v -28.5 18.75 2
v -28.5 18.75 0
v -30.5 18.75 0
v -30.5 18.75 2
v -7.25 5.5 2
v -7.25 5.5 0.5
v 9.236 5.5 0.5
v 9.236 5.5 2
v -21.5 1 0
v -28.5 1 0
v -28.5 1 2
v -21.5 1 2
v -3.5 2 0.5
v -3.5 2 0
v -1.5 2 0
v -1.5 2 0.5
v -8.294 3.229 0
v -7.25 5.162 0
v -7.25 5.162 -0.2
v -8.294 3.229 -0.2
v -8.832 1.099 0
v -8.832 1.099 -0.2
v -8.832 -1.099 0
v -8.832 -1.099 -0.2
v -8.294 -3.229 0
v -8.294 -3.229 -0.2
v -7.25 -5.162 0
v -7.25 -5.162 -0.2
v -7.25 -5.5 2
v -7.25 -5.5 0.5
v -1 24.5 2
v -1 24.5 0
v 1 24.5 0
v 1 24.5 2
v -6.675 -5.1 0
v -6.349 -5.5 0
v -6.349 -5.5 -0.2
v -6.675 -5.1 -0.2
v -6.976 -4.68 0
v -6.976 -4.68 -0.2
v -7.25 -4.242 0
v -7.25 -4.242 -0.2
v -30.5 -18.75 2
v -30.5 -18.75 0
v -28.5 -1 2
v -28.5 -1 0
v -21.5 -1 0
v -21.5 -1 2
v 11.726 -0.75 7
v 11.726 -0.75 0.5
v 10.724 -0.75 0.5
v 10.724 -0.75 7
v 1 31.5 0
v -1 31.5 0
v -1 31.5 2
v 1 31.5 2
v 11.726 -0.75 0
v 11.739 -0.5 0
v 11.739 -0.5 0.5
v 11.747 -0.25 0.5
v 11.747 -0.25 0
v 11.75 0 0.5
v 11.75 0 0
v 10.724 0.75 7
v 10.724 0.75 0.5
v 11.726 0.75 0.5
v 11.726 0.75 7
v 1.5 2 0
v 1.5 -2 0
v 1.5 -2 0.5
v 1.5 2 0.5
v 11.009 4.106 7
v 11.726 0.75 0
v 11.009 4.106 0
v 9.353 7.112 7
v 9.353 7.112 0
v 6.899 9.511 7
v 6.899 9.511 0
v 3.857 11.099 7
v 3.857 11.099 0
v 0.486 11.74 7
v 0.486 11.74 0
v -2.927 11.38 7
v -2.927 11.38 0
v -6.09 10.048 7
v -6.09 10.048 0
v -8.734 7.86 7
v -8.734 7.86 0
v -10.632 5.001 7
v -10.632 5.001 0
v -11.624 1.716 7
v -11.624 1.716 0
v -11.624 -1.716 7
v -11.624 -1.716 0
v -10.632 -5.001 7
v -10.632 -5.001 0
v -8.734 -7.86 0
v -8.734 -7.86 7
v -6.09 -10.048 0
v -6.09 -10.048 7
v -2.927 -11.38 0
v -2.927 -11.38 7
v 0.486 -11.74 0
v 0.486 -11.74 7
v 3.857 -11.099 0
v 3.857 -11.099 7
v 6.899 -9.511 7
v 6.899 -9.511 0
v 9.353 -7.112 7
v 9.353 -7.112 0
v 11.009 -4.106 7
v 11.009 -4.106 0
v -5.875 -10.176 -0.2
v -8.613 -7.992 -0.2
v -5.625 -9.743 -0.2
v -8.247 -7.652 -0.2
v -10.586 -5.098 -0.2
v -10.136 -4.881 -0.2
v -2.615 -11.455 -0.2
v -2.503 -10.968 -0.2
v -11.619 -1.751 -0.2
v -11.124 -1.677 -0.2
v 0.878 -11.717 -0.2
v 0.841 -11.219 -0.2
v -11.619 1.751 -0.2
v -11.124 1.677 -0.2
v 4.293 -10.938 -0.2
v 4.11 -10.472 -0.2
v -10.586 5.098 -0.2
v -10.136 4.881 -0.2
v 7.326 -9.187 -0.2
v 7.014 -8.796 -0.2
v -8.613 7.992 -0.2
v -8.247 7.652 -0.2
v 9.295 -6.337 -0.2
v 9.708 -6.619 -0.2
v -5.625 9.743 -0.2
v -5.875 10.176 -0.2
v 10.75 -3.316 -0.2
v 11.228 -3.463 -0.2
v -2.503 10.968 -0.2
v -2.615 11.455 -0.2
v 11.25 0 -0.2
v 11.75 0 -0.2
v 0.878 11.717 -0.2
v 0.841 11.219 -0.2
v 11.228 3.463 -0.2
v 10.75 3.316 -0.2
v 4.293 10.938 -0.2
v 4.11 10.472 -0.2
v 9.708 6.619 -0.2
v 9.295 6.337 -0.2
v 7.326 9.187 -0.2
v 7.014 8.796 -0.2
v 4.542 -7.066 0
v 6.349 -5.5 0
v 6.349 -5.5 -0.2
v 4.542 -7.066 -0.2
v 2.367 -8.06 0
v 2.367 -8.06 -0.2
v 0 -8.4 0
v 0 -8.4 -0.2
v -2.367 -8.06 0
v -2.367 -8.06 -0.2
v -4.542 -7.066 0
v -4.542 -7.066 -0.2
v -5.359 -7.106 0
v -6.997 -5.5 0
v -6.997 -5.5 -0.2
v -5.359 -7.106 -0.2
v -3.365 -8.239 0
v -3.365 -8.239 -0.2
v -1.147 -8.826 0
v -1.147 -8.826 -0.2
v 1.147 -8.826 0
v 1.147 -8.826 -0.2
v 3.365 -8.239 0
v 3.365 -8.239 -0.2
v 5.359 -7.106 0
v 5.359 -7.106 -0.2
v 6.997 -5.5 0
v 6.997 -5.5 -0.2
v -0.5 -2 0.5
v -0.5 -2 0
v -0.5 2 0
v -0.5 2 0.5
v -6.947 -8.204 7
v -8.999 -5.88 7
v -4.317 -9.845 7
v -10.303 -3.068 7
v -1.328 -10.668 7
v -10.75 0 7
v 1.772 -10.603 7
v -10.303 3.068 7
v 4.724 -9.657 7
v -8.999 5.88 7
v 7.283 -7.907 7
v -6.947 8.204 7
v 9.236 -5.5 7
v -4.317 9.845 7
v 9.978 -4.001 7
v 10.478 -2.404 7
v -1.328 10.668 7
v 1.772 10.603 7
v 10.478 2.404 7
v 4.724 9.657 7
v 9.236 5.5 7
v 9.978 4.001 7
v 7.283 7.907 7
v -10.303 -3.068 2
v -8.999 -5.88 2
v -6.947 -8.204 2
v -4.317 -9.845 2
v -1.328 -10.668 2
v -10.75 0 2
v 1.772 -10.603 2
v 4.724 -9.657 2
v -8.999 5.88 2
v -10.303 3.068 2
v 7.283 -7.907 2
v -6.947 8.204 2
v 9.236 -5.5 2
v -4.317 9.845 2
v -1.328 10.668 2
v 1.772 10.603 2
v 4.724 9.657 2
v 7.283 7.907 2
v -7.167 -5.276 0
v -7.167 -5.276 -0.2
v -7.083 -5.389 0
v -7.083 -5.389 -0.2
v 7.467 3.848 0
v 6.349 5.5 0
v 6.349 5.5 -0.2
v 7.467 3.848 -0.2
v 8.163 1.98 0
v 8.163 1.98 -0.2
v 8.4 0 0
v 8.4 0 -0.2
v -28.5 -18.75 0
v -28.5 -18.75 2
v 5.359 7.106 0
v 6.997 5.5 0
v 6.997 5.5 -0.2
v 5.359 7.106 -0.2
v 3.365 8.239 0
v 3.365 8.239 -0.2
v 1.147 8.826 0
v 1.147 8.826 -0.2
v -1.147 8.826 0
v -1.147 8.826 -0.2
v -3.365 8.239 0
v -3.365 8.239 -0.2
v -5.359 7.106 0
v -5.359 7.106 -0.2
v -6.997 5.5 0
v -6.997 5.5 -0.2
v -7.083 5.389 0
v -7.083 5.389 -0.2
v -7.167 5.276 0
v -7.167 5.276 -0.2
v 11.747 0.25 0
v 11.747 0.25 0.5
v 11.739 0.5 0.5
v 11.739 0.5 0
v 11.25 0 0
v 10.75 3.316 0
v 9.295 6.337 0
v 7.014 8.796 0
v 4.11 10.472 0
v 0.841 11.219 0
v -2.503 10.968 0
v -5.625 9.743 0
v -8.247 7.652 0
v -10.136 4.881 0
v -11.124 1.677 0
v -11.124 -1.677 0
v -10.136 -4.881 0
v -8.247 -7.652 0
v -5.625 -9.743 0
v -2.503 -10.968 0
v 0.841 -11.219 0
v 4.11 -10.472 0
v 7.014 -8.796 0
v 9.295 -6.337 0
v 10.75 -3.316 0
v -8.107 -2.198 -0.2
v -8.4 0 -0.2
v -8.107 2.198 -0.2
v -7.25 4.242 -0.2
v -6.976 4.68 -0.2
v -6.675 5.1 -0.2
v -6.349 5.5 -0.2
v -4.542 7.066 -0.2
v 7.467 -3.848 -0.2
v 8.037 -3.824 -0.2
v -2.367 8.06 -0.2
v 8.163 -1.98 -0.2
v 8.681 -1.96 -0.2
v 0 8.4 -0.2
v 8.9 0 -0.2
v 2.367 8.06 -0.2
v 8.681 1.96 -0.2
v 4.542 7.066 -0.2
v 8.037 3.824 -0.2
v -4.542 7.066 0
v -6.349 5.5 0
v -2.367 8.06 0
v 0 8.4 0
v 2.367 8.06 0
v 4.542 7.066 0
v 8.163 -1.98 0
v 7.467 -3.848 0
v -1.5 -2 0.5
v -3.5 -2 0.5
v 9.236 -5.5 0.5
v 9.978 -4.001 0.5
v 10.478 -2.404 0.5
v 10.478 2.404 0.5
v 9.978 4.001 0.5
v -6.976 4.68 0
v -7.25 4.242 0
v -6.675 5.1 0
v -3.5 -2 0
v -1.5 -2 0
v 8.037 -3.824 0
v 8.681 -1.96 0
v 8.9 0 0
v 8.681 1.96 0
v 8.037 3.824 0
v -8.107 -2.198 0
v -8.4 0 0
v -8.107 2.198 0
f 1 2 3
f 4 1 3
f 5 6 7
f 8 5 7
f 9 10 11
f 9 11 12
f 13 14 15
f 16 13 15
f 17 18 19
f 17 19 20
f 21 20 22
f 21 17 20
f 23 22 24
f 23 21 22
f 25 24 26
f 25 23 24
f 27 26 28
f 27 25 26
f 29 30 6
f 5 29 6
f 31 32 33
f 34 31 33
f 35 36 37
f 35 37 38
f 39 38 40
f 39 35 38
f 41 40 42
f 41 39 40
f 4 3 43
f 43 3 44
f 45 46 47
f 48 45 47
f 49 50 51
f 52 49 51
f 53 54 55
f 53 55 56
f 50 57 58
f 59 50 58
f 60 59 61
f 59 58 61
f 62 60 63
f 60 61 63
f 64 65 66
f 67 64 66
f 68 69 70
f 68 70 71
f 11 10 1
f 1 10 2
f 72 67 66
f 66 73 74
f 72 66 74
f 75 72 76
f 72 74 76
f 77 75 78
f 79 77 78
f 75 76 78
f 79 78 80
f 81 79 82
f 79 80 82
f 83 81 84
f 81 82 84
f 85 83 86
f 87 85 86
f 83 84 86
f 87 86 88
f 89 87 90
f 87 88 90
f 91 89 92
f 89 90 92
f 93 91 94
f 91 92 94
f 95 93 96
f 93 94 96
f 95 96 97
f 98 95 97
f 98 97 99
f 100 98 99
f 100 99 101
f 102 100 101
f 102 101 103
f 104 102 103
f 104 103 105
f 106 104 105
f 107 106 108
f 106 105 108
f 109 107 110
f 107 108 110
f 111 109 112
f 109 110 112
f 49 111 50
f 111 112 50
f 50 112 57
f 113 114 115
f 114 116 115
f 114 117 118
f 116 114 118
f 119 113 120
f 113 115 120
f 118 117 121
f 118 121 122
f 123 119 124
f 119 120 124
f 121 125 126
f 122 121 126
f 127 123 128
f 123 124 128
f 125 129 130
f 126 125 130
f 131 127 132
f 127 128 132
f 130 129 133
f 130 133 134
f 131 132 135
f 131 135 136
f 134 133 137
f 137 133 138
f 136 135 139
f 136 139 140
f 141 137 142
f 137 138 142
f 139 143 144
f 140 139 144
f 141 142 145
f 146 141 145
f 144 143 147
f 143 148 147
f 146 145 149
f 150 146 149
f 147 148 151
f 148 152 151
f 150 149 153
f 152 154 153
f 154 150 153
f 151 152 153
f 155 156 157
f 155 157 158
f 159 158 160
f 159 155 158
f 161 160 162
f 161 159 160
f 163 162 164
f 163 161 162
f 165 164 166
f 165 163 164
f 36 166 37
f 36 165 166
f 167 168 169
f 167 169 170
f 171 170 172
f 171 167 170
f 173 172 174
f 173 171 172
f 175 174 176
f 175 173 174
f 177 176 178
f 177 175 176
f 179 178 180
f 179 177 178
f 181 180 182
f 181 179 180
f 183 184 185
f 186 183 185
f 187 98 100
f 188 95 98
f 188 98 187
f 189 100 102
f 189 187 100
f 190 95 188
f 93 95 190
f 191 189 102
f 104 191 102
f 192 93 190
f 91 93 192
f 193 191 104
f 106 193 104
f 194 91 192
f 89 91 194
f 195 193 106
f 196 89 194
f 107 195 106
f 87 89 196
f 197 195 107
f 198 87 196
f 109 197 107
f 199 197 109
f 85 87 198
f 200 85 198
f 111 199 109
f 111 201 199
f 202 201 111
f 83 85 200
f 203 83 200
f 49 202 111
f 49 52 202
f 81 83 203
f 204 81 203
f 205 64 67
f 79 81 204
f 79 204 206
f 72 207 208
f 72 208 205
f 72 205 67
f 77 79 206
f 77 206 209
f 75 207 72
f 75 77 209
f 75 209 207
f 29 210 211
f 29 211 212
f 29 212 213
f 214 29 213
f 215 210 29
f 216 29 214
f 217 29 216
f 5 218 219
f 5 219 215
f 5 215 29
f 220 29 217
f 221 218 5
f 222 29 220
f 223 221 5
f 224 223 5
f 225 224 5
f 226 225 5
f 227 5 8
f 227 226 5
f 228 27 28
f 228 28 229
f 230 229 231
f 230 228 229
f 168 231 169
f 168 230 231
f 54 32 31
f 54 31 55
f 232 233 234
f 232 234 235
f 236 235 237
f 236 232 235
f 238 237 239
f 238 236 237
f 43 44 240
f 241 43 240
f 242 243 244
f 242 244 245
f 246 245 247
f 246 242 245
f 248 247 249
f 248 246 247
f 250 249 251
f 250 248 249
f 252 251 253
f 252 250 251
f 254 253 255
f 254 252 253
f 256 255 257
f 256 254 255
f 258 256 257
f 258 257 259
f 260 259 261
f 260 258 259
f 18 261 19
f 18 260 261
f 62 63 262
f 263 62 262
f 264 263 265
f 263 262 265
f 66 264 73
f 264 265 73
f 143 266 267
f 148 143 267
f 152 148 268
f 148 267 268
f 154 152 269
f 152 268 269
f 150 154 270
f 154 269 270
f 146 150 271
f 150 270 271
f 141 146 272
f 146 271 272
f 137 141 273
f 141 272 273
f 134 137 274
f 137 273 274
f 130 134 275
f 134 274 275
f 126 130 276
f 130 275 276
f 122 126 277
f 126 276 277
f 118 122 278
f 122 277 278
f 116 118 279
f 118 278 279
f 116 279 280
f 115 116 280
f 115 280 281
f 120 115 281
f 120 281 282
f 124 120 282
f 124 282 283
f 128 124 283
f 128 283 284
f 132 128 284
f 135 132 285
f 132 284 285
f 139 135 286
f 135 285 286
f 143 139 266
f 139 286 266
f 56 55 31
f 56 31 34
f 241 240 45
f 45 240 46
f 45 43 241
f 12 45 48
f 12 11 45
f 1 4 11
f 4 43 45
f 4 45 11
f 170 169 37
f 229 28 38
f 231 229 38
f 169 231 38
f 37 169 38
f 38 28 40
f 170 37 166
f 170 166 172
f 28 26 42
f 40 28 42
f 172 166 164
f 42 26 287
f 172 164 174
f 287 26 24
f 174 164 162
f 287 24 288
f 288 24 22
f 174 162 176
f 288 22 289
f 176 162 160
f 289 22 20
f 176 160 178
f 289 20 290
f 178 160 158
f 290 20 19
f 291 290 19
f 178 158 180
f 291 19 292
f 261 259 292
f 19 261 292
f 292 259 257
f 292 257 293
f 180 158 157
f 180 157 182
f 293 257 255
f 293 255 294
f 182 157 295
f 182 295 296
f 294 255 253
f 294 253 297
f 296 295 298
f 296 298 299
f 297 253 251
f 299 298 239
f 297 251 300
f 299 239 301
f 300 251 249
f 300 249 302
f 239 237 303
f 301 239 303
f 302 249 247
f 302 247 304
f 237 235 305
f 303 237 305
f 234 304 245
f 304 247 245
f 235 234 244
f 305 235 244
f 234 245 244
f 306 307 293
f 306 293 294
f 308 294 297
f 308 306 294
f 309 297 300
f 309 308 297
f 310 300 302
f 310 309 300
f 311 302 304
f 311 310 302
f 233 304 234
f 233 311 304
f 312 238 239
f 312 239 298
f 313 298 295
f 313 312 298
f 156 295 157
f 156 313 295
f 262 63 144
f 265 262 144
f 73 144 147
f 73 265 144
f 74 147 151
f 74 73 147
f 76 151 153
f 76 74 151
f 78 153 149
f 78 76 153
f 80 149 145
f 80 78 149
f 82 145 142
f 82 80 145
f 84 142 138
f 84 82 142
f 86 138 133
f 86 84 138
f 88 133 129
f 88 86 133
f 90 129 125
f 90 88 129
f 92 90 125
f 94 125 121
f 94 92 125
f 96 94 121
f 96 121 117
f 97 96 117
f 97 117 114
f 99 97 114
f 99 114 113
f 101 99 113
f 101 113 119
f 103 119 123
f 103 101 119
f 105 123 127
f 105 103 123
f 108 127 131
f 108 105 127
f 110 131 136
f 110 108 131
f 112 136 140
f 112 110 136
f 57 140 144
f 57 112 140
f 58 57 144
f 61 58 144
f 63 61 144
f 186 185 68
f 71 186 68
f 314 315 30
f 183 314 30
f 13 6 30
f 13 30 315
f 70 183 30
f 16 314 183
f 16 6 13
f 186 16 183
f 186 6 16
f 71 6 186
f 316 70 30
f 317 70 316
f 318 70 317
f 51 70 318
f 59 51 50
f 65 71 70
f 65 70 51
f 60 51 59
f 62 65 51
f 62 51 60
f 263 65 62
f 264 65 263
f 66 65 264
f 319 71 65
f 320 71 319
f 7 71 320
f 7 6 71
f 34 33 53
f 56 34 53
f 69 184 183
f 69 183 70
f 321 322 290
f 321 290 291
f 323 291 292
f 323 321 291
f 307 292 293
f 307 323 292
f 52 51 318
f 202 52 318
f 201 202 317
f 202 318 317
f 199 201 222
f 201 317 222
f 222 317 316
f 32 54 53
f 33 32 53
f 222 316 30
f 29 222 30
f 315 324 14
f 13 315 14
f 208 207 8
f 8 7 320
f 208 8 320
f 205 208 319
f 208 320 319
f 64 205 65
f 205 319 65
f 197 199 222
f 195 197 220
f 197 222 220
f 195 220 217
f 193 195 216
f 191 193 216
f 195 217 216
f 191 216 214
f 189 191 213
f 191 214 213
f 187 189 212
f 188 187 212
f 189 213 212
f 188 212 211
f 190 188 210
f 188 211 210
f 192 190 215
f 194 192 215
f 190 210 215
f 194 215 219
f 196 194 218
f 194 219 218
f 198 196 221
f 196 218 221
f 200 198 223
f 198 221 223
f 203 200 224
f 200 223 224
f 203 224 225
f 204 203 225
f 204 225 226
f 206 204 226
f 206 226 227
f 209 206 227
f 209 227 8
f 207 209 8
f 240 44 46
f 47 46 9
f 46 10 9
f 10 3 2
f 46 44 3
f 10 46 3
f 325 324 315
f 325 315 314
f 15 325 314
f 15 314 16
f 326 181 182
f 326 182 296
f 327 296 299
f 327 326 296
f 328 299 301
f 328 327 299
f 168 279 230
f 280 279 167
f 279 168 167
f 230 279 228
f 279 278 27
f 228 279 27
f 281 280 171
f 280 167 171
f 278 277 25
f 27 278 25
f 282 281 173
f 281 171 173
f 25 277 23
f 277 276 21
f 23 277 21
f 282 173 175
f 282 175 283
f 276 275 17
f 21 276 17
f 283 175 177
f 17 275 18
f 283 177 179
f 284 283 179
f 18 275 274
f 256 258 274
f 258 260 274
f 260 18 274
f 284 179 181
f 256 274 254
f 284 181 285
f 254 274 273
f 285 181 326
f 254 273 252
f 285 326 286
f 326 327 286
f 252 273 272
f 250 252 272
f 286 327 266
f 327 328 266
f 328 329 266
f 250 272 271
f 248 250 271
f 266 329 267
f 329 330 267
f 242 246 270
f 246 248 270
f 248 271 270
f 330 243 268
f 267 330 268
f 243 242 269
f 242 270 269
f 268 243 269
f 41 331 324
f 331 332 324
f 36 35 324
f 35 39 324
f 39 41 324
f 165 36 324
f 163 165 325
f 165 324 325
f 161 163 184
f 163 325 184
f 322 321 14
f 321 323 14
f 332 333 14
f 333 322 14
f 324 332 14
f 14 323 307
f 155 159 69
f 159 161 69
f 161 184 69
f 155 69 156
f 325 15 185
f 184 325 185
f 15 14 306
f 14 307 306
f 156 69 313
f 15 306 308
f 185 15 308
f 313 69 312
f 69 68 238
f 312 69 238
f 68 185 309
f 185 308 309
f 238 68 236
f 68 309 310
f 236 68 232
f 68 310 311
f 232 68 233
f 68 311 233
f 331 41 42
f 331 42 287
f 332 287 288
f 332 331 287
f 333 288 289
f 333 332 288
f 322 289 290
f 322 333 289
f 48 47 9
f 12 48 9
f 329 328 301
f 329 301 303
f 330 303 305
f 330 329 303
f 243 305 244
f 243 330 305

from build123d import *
from build123d import SkipClean  # not in build123d's __all__

# Parameters (mm, degrees)
F2_DEPTH = 7
F3_DEPTH = 2
F0_W     = 14.5
F0_H     = 11
F0_W_2   = 2
F0_H_2   = 4
F4_DEPTH = 0.5
F5_DEPTH = 0.5
F1_R     = 11.75
F1_R_2   = 11.25
F6_DEPTH = 0.2
F7_W     = 7
F7_H     = 2
F8_DEPTH = 2
F7_W_2   = 2
F7_H_2   = 7


with BuildPart() as f2:
    # F0 (on Top) → F2 (new body)
    with BuildSketch(Plane.XY):
        with BuildLine():
            ThreePointArc((9.236476601, 5.5), (10.258841959, 3.2122673707), (10.7238052948, 0.75))
            Line((10.7238052948, 0.75), (11.7260393996, 0.75))
            ThreePointArc((11.7260393996, 0.75), (-11.75, 0), (11.7260393996, -0.75))
            Line((11.7260393996, -0.75), (10.7238052948, -0.75))
            ThreePointArc((10.7238052948, -0.75), (10.258841959, -3.2122673707), (9.236476601, -5.5))
            ThreePointArc((9.236476601, -5.5), (-10.75, 0), (9.236476601, 5.5))
        make_face()
    extrude(amount=F2_DEPTH)

    # F0 (on Top) → F3 (join)
    with BuildSketch(Plane.XY):
        with BuildLine():
            Line((7.25, 5.5), (9.236476601, 5.5))
            ThreePointArc((9.236476601, 5.5), (-10.75, 0), (9.236476601, -5.5))
            Line((9.236476601, -5.5), (7.25, -5.5))
            Line((7.25, -5.5), (-7.25, -5.5))
            Line((-7.25, -5.5), (-7.25, 5.5))
            Line((-7.25, 5.5), (7.25, 5.5))
        make_face()
    extrude(amount=F3_DEPTH)

    # F0 (on Top) → F4 (join)
    with BuildSketch(Plane.XY):
        Rectangle(F0_W, F0_H)
        with Locations((-2.5, 0)):
            Rectangle(F0_W_2, F0_H_2, mode=Mode.SUBTRACT)
        with Locations((0.5, 0)):
            Rectangle(F0_W_2, F0_H_2, mode=Mode.SUBTRACT)
    extrude(amount=F4_DEPTH)

    # F0 (on Top) → F5 (join)
    with BuildSketch(Plane.XY):
        with BuildLine():
            ThreePointArc((10.7238052948, -0.75), (10.7434493278, -0.3752286512), (10.75, 0))
            ThreePointArc((10.75, 0), (10.7434493278, 0.3752286512), (10.7238052948, 0.75))
            ThreePointArc((10.7238052948, 0.75), (10.258841959, 3.2122673707), (9.236476601, 5.5))
            Line((9.236476601, 5.5), (7.25, 5.5))
            Line((7.25, 5.5), (7.25, -5.5))
            Line((7.25, -5.5), (9.236476601, -5.5))
            ThreePointArc((9.236476601, -5.5), (10.258841959, -3.2122673707), (10.7238052948, -0.75))
        make_face()
        with BuildLine():
            ThreePointArc((10.7238052948, 0.75), (10.7434493278, 0.3752286512), (10.75, 0))
            ThreePointArc((10.75, 0), (10.7434493278, -0.3752286512), (10.7238052948, -0.75))
            Line((10.7238052948, -0.75), (11.7260393996, -0.75))
            ThreePointArc((11.7260393996, -0.75), (11.7440083222, -0.3751913213), (11.75, 0))
            ThreePointArc((11.75, 0), (11.7440083222, 0.3751913213), (11.7260393996, 0.75))
            Line((11.7260393996, 0.75), (10.7238052948, 0.75))
        make_face()
    extrude(amount=F5_DEPTH)

    # F1 (on face) → F6 (join)
    with BuildSketch(Plane.XY):
        Circle(F1_R)
        Circle(F1_R_2, mode=Mode.SUBTRACT)
        with BuildLine():
            ThreePointArc((6.9971422738, -5.5), (8.4108431871, -2.9099341713), (8.9, 0))
            ThreePointArc((8.9, 0), (8.4108431871, 2.9099341713), (6.9971422738, 5.5))
            Line((6.9971422738, 5.5), (6.3490156717, 5.5))
            ThreePointArc((6.3490156717, 5.5), (7.8705695995, 2.9349845278), (8.4, 0))
            ThreePointArc((8.4, 0), (7.8705695995, -2.9349845278), (6.3490156717, -5.5))
            Line((6.3490156717, -5.5), (6.9971422738, -5.5))
        make_face()
        with BuildLine():
            ThreePointArc((-6.9971422738, -5.5), (0, -8.9), (6.9971422738, -5.5))
            Line((6.9971422738, -5.5), (6.3490156717, -5.5))
            ThreePointArc((6.3490156717, -5.5), (0, -8.4), (-6.3490156717, -5.5))
            Line((-6.3490156717, -5.5), (-6.9971422738, -5.5))
        make_face()
        with BuildLine():
            ThreePointArc((-7.25, -5.1621216568), (-7.1255740952, -5.3325597806), (-6.9971422738, -5.5))
            Line((-6.9971422738, -5.5), (-6.3490156717, -5.5))
            ThreePointArc((-6.3490156717, -5.5), (-6.8285232792, -4.8919597121), (-7.25, -4.2423460491))
            Line((-7.25, -4.2423460491), (-7.25, -5.1621216568))
        make_face()
        with BuildLine():
            Line((-7.25, 4.2423460491), (-7.25, 5.1621216568))
            ThreePointArc((-7.25, 5.1621216568), (-8.9, 0), (-7.25, -5.1621216568))
            Line((-7.25, -5.1621216568), (-7.25, -4.2423460491))
            ThreePointArc((-7.25, -4.2423460491), (-8.4, 0), (-7.25, 4.2423460491))
        make_face()
        with BuildLine():
            Line((6.3490156717, 5.5), (6.9971422738, 5.5))
            ThreePointArc((6.9971422738, 5.5), (0, 8.9), (-6.9971422738, 5.5))
            Line((-6.9971422738, 5.5), (-6.3490156717, 5.5))
            ThreePointArc((-6.3490156717, 5.5), (0, 8.4), (6.3490156717, 5.5))
        make_face()
        with BuildLine():
            Line((-6.3490156717, 5.5), (-6.9971422738, 5.5))
            ThreePointArc((-6.9971422738, 5.5), (-7.1255740952, 5.3325597806), (-7.25, 5.1621216568))
            Line((-7.25, 5.1621216568), (-7.25, 4.2423460491))
            ThreePointArc((-7.25, 4.2423460491), (-6.8285232792, 4.8919597121), (-6.3490156717, 5.5))
        make_face()
    with SkipClean():  # cleaning this boolean's faces spoils the solid; the shape is the same uncleaned
        extrude(amount=-F6_DEPTH)


with BuildPart() as f8:
    # F7 (on Top) → F8 (new body)
    with BuildSketch(Plane.XY):
        Polygon((-28.5, 18.75), (-30.5, 18.75), (-30.5, -18.75), (-28.5, -18.75), (-28.5, -1), (-28.5, 1), align=None)
        with Locations((-25, 0)):
            Rectangle(F7_W, F7_H)
    extrude(amount=F8_DEPTH)


with BuildPart() as f8b:
    # F7 (on Top) → F8, piece 2 (new body)
    with BuildSketch(Plane.XY):
        with Locations((0, 28)):
            Rectangle(F7_W_2, F7_H_2)
    extrude(amount=F8_DEPTH)


solid = Compound([f2.part, f8.part, f8b.part])
